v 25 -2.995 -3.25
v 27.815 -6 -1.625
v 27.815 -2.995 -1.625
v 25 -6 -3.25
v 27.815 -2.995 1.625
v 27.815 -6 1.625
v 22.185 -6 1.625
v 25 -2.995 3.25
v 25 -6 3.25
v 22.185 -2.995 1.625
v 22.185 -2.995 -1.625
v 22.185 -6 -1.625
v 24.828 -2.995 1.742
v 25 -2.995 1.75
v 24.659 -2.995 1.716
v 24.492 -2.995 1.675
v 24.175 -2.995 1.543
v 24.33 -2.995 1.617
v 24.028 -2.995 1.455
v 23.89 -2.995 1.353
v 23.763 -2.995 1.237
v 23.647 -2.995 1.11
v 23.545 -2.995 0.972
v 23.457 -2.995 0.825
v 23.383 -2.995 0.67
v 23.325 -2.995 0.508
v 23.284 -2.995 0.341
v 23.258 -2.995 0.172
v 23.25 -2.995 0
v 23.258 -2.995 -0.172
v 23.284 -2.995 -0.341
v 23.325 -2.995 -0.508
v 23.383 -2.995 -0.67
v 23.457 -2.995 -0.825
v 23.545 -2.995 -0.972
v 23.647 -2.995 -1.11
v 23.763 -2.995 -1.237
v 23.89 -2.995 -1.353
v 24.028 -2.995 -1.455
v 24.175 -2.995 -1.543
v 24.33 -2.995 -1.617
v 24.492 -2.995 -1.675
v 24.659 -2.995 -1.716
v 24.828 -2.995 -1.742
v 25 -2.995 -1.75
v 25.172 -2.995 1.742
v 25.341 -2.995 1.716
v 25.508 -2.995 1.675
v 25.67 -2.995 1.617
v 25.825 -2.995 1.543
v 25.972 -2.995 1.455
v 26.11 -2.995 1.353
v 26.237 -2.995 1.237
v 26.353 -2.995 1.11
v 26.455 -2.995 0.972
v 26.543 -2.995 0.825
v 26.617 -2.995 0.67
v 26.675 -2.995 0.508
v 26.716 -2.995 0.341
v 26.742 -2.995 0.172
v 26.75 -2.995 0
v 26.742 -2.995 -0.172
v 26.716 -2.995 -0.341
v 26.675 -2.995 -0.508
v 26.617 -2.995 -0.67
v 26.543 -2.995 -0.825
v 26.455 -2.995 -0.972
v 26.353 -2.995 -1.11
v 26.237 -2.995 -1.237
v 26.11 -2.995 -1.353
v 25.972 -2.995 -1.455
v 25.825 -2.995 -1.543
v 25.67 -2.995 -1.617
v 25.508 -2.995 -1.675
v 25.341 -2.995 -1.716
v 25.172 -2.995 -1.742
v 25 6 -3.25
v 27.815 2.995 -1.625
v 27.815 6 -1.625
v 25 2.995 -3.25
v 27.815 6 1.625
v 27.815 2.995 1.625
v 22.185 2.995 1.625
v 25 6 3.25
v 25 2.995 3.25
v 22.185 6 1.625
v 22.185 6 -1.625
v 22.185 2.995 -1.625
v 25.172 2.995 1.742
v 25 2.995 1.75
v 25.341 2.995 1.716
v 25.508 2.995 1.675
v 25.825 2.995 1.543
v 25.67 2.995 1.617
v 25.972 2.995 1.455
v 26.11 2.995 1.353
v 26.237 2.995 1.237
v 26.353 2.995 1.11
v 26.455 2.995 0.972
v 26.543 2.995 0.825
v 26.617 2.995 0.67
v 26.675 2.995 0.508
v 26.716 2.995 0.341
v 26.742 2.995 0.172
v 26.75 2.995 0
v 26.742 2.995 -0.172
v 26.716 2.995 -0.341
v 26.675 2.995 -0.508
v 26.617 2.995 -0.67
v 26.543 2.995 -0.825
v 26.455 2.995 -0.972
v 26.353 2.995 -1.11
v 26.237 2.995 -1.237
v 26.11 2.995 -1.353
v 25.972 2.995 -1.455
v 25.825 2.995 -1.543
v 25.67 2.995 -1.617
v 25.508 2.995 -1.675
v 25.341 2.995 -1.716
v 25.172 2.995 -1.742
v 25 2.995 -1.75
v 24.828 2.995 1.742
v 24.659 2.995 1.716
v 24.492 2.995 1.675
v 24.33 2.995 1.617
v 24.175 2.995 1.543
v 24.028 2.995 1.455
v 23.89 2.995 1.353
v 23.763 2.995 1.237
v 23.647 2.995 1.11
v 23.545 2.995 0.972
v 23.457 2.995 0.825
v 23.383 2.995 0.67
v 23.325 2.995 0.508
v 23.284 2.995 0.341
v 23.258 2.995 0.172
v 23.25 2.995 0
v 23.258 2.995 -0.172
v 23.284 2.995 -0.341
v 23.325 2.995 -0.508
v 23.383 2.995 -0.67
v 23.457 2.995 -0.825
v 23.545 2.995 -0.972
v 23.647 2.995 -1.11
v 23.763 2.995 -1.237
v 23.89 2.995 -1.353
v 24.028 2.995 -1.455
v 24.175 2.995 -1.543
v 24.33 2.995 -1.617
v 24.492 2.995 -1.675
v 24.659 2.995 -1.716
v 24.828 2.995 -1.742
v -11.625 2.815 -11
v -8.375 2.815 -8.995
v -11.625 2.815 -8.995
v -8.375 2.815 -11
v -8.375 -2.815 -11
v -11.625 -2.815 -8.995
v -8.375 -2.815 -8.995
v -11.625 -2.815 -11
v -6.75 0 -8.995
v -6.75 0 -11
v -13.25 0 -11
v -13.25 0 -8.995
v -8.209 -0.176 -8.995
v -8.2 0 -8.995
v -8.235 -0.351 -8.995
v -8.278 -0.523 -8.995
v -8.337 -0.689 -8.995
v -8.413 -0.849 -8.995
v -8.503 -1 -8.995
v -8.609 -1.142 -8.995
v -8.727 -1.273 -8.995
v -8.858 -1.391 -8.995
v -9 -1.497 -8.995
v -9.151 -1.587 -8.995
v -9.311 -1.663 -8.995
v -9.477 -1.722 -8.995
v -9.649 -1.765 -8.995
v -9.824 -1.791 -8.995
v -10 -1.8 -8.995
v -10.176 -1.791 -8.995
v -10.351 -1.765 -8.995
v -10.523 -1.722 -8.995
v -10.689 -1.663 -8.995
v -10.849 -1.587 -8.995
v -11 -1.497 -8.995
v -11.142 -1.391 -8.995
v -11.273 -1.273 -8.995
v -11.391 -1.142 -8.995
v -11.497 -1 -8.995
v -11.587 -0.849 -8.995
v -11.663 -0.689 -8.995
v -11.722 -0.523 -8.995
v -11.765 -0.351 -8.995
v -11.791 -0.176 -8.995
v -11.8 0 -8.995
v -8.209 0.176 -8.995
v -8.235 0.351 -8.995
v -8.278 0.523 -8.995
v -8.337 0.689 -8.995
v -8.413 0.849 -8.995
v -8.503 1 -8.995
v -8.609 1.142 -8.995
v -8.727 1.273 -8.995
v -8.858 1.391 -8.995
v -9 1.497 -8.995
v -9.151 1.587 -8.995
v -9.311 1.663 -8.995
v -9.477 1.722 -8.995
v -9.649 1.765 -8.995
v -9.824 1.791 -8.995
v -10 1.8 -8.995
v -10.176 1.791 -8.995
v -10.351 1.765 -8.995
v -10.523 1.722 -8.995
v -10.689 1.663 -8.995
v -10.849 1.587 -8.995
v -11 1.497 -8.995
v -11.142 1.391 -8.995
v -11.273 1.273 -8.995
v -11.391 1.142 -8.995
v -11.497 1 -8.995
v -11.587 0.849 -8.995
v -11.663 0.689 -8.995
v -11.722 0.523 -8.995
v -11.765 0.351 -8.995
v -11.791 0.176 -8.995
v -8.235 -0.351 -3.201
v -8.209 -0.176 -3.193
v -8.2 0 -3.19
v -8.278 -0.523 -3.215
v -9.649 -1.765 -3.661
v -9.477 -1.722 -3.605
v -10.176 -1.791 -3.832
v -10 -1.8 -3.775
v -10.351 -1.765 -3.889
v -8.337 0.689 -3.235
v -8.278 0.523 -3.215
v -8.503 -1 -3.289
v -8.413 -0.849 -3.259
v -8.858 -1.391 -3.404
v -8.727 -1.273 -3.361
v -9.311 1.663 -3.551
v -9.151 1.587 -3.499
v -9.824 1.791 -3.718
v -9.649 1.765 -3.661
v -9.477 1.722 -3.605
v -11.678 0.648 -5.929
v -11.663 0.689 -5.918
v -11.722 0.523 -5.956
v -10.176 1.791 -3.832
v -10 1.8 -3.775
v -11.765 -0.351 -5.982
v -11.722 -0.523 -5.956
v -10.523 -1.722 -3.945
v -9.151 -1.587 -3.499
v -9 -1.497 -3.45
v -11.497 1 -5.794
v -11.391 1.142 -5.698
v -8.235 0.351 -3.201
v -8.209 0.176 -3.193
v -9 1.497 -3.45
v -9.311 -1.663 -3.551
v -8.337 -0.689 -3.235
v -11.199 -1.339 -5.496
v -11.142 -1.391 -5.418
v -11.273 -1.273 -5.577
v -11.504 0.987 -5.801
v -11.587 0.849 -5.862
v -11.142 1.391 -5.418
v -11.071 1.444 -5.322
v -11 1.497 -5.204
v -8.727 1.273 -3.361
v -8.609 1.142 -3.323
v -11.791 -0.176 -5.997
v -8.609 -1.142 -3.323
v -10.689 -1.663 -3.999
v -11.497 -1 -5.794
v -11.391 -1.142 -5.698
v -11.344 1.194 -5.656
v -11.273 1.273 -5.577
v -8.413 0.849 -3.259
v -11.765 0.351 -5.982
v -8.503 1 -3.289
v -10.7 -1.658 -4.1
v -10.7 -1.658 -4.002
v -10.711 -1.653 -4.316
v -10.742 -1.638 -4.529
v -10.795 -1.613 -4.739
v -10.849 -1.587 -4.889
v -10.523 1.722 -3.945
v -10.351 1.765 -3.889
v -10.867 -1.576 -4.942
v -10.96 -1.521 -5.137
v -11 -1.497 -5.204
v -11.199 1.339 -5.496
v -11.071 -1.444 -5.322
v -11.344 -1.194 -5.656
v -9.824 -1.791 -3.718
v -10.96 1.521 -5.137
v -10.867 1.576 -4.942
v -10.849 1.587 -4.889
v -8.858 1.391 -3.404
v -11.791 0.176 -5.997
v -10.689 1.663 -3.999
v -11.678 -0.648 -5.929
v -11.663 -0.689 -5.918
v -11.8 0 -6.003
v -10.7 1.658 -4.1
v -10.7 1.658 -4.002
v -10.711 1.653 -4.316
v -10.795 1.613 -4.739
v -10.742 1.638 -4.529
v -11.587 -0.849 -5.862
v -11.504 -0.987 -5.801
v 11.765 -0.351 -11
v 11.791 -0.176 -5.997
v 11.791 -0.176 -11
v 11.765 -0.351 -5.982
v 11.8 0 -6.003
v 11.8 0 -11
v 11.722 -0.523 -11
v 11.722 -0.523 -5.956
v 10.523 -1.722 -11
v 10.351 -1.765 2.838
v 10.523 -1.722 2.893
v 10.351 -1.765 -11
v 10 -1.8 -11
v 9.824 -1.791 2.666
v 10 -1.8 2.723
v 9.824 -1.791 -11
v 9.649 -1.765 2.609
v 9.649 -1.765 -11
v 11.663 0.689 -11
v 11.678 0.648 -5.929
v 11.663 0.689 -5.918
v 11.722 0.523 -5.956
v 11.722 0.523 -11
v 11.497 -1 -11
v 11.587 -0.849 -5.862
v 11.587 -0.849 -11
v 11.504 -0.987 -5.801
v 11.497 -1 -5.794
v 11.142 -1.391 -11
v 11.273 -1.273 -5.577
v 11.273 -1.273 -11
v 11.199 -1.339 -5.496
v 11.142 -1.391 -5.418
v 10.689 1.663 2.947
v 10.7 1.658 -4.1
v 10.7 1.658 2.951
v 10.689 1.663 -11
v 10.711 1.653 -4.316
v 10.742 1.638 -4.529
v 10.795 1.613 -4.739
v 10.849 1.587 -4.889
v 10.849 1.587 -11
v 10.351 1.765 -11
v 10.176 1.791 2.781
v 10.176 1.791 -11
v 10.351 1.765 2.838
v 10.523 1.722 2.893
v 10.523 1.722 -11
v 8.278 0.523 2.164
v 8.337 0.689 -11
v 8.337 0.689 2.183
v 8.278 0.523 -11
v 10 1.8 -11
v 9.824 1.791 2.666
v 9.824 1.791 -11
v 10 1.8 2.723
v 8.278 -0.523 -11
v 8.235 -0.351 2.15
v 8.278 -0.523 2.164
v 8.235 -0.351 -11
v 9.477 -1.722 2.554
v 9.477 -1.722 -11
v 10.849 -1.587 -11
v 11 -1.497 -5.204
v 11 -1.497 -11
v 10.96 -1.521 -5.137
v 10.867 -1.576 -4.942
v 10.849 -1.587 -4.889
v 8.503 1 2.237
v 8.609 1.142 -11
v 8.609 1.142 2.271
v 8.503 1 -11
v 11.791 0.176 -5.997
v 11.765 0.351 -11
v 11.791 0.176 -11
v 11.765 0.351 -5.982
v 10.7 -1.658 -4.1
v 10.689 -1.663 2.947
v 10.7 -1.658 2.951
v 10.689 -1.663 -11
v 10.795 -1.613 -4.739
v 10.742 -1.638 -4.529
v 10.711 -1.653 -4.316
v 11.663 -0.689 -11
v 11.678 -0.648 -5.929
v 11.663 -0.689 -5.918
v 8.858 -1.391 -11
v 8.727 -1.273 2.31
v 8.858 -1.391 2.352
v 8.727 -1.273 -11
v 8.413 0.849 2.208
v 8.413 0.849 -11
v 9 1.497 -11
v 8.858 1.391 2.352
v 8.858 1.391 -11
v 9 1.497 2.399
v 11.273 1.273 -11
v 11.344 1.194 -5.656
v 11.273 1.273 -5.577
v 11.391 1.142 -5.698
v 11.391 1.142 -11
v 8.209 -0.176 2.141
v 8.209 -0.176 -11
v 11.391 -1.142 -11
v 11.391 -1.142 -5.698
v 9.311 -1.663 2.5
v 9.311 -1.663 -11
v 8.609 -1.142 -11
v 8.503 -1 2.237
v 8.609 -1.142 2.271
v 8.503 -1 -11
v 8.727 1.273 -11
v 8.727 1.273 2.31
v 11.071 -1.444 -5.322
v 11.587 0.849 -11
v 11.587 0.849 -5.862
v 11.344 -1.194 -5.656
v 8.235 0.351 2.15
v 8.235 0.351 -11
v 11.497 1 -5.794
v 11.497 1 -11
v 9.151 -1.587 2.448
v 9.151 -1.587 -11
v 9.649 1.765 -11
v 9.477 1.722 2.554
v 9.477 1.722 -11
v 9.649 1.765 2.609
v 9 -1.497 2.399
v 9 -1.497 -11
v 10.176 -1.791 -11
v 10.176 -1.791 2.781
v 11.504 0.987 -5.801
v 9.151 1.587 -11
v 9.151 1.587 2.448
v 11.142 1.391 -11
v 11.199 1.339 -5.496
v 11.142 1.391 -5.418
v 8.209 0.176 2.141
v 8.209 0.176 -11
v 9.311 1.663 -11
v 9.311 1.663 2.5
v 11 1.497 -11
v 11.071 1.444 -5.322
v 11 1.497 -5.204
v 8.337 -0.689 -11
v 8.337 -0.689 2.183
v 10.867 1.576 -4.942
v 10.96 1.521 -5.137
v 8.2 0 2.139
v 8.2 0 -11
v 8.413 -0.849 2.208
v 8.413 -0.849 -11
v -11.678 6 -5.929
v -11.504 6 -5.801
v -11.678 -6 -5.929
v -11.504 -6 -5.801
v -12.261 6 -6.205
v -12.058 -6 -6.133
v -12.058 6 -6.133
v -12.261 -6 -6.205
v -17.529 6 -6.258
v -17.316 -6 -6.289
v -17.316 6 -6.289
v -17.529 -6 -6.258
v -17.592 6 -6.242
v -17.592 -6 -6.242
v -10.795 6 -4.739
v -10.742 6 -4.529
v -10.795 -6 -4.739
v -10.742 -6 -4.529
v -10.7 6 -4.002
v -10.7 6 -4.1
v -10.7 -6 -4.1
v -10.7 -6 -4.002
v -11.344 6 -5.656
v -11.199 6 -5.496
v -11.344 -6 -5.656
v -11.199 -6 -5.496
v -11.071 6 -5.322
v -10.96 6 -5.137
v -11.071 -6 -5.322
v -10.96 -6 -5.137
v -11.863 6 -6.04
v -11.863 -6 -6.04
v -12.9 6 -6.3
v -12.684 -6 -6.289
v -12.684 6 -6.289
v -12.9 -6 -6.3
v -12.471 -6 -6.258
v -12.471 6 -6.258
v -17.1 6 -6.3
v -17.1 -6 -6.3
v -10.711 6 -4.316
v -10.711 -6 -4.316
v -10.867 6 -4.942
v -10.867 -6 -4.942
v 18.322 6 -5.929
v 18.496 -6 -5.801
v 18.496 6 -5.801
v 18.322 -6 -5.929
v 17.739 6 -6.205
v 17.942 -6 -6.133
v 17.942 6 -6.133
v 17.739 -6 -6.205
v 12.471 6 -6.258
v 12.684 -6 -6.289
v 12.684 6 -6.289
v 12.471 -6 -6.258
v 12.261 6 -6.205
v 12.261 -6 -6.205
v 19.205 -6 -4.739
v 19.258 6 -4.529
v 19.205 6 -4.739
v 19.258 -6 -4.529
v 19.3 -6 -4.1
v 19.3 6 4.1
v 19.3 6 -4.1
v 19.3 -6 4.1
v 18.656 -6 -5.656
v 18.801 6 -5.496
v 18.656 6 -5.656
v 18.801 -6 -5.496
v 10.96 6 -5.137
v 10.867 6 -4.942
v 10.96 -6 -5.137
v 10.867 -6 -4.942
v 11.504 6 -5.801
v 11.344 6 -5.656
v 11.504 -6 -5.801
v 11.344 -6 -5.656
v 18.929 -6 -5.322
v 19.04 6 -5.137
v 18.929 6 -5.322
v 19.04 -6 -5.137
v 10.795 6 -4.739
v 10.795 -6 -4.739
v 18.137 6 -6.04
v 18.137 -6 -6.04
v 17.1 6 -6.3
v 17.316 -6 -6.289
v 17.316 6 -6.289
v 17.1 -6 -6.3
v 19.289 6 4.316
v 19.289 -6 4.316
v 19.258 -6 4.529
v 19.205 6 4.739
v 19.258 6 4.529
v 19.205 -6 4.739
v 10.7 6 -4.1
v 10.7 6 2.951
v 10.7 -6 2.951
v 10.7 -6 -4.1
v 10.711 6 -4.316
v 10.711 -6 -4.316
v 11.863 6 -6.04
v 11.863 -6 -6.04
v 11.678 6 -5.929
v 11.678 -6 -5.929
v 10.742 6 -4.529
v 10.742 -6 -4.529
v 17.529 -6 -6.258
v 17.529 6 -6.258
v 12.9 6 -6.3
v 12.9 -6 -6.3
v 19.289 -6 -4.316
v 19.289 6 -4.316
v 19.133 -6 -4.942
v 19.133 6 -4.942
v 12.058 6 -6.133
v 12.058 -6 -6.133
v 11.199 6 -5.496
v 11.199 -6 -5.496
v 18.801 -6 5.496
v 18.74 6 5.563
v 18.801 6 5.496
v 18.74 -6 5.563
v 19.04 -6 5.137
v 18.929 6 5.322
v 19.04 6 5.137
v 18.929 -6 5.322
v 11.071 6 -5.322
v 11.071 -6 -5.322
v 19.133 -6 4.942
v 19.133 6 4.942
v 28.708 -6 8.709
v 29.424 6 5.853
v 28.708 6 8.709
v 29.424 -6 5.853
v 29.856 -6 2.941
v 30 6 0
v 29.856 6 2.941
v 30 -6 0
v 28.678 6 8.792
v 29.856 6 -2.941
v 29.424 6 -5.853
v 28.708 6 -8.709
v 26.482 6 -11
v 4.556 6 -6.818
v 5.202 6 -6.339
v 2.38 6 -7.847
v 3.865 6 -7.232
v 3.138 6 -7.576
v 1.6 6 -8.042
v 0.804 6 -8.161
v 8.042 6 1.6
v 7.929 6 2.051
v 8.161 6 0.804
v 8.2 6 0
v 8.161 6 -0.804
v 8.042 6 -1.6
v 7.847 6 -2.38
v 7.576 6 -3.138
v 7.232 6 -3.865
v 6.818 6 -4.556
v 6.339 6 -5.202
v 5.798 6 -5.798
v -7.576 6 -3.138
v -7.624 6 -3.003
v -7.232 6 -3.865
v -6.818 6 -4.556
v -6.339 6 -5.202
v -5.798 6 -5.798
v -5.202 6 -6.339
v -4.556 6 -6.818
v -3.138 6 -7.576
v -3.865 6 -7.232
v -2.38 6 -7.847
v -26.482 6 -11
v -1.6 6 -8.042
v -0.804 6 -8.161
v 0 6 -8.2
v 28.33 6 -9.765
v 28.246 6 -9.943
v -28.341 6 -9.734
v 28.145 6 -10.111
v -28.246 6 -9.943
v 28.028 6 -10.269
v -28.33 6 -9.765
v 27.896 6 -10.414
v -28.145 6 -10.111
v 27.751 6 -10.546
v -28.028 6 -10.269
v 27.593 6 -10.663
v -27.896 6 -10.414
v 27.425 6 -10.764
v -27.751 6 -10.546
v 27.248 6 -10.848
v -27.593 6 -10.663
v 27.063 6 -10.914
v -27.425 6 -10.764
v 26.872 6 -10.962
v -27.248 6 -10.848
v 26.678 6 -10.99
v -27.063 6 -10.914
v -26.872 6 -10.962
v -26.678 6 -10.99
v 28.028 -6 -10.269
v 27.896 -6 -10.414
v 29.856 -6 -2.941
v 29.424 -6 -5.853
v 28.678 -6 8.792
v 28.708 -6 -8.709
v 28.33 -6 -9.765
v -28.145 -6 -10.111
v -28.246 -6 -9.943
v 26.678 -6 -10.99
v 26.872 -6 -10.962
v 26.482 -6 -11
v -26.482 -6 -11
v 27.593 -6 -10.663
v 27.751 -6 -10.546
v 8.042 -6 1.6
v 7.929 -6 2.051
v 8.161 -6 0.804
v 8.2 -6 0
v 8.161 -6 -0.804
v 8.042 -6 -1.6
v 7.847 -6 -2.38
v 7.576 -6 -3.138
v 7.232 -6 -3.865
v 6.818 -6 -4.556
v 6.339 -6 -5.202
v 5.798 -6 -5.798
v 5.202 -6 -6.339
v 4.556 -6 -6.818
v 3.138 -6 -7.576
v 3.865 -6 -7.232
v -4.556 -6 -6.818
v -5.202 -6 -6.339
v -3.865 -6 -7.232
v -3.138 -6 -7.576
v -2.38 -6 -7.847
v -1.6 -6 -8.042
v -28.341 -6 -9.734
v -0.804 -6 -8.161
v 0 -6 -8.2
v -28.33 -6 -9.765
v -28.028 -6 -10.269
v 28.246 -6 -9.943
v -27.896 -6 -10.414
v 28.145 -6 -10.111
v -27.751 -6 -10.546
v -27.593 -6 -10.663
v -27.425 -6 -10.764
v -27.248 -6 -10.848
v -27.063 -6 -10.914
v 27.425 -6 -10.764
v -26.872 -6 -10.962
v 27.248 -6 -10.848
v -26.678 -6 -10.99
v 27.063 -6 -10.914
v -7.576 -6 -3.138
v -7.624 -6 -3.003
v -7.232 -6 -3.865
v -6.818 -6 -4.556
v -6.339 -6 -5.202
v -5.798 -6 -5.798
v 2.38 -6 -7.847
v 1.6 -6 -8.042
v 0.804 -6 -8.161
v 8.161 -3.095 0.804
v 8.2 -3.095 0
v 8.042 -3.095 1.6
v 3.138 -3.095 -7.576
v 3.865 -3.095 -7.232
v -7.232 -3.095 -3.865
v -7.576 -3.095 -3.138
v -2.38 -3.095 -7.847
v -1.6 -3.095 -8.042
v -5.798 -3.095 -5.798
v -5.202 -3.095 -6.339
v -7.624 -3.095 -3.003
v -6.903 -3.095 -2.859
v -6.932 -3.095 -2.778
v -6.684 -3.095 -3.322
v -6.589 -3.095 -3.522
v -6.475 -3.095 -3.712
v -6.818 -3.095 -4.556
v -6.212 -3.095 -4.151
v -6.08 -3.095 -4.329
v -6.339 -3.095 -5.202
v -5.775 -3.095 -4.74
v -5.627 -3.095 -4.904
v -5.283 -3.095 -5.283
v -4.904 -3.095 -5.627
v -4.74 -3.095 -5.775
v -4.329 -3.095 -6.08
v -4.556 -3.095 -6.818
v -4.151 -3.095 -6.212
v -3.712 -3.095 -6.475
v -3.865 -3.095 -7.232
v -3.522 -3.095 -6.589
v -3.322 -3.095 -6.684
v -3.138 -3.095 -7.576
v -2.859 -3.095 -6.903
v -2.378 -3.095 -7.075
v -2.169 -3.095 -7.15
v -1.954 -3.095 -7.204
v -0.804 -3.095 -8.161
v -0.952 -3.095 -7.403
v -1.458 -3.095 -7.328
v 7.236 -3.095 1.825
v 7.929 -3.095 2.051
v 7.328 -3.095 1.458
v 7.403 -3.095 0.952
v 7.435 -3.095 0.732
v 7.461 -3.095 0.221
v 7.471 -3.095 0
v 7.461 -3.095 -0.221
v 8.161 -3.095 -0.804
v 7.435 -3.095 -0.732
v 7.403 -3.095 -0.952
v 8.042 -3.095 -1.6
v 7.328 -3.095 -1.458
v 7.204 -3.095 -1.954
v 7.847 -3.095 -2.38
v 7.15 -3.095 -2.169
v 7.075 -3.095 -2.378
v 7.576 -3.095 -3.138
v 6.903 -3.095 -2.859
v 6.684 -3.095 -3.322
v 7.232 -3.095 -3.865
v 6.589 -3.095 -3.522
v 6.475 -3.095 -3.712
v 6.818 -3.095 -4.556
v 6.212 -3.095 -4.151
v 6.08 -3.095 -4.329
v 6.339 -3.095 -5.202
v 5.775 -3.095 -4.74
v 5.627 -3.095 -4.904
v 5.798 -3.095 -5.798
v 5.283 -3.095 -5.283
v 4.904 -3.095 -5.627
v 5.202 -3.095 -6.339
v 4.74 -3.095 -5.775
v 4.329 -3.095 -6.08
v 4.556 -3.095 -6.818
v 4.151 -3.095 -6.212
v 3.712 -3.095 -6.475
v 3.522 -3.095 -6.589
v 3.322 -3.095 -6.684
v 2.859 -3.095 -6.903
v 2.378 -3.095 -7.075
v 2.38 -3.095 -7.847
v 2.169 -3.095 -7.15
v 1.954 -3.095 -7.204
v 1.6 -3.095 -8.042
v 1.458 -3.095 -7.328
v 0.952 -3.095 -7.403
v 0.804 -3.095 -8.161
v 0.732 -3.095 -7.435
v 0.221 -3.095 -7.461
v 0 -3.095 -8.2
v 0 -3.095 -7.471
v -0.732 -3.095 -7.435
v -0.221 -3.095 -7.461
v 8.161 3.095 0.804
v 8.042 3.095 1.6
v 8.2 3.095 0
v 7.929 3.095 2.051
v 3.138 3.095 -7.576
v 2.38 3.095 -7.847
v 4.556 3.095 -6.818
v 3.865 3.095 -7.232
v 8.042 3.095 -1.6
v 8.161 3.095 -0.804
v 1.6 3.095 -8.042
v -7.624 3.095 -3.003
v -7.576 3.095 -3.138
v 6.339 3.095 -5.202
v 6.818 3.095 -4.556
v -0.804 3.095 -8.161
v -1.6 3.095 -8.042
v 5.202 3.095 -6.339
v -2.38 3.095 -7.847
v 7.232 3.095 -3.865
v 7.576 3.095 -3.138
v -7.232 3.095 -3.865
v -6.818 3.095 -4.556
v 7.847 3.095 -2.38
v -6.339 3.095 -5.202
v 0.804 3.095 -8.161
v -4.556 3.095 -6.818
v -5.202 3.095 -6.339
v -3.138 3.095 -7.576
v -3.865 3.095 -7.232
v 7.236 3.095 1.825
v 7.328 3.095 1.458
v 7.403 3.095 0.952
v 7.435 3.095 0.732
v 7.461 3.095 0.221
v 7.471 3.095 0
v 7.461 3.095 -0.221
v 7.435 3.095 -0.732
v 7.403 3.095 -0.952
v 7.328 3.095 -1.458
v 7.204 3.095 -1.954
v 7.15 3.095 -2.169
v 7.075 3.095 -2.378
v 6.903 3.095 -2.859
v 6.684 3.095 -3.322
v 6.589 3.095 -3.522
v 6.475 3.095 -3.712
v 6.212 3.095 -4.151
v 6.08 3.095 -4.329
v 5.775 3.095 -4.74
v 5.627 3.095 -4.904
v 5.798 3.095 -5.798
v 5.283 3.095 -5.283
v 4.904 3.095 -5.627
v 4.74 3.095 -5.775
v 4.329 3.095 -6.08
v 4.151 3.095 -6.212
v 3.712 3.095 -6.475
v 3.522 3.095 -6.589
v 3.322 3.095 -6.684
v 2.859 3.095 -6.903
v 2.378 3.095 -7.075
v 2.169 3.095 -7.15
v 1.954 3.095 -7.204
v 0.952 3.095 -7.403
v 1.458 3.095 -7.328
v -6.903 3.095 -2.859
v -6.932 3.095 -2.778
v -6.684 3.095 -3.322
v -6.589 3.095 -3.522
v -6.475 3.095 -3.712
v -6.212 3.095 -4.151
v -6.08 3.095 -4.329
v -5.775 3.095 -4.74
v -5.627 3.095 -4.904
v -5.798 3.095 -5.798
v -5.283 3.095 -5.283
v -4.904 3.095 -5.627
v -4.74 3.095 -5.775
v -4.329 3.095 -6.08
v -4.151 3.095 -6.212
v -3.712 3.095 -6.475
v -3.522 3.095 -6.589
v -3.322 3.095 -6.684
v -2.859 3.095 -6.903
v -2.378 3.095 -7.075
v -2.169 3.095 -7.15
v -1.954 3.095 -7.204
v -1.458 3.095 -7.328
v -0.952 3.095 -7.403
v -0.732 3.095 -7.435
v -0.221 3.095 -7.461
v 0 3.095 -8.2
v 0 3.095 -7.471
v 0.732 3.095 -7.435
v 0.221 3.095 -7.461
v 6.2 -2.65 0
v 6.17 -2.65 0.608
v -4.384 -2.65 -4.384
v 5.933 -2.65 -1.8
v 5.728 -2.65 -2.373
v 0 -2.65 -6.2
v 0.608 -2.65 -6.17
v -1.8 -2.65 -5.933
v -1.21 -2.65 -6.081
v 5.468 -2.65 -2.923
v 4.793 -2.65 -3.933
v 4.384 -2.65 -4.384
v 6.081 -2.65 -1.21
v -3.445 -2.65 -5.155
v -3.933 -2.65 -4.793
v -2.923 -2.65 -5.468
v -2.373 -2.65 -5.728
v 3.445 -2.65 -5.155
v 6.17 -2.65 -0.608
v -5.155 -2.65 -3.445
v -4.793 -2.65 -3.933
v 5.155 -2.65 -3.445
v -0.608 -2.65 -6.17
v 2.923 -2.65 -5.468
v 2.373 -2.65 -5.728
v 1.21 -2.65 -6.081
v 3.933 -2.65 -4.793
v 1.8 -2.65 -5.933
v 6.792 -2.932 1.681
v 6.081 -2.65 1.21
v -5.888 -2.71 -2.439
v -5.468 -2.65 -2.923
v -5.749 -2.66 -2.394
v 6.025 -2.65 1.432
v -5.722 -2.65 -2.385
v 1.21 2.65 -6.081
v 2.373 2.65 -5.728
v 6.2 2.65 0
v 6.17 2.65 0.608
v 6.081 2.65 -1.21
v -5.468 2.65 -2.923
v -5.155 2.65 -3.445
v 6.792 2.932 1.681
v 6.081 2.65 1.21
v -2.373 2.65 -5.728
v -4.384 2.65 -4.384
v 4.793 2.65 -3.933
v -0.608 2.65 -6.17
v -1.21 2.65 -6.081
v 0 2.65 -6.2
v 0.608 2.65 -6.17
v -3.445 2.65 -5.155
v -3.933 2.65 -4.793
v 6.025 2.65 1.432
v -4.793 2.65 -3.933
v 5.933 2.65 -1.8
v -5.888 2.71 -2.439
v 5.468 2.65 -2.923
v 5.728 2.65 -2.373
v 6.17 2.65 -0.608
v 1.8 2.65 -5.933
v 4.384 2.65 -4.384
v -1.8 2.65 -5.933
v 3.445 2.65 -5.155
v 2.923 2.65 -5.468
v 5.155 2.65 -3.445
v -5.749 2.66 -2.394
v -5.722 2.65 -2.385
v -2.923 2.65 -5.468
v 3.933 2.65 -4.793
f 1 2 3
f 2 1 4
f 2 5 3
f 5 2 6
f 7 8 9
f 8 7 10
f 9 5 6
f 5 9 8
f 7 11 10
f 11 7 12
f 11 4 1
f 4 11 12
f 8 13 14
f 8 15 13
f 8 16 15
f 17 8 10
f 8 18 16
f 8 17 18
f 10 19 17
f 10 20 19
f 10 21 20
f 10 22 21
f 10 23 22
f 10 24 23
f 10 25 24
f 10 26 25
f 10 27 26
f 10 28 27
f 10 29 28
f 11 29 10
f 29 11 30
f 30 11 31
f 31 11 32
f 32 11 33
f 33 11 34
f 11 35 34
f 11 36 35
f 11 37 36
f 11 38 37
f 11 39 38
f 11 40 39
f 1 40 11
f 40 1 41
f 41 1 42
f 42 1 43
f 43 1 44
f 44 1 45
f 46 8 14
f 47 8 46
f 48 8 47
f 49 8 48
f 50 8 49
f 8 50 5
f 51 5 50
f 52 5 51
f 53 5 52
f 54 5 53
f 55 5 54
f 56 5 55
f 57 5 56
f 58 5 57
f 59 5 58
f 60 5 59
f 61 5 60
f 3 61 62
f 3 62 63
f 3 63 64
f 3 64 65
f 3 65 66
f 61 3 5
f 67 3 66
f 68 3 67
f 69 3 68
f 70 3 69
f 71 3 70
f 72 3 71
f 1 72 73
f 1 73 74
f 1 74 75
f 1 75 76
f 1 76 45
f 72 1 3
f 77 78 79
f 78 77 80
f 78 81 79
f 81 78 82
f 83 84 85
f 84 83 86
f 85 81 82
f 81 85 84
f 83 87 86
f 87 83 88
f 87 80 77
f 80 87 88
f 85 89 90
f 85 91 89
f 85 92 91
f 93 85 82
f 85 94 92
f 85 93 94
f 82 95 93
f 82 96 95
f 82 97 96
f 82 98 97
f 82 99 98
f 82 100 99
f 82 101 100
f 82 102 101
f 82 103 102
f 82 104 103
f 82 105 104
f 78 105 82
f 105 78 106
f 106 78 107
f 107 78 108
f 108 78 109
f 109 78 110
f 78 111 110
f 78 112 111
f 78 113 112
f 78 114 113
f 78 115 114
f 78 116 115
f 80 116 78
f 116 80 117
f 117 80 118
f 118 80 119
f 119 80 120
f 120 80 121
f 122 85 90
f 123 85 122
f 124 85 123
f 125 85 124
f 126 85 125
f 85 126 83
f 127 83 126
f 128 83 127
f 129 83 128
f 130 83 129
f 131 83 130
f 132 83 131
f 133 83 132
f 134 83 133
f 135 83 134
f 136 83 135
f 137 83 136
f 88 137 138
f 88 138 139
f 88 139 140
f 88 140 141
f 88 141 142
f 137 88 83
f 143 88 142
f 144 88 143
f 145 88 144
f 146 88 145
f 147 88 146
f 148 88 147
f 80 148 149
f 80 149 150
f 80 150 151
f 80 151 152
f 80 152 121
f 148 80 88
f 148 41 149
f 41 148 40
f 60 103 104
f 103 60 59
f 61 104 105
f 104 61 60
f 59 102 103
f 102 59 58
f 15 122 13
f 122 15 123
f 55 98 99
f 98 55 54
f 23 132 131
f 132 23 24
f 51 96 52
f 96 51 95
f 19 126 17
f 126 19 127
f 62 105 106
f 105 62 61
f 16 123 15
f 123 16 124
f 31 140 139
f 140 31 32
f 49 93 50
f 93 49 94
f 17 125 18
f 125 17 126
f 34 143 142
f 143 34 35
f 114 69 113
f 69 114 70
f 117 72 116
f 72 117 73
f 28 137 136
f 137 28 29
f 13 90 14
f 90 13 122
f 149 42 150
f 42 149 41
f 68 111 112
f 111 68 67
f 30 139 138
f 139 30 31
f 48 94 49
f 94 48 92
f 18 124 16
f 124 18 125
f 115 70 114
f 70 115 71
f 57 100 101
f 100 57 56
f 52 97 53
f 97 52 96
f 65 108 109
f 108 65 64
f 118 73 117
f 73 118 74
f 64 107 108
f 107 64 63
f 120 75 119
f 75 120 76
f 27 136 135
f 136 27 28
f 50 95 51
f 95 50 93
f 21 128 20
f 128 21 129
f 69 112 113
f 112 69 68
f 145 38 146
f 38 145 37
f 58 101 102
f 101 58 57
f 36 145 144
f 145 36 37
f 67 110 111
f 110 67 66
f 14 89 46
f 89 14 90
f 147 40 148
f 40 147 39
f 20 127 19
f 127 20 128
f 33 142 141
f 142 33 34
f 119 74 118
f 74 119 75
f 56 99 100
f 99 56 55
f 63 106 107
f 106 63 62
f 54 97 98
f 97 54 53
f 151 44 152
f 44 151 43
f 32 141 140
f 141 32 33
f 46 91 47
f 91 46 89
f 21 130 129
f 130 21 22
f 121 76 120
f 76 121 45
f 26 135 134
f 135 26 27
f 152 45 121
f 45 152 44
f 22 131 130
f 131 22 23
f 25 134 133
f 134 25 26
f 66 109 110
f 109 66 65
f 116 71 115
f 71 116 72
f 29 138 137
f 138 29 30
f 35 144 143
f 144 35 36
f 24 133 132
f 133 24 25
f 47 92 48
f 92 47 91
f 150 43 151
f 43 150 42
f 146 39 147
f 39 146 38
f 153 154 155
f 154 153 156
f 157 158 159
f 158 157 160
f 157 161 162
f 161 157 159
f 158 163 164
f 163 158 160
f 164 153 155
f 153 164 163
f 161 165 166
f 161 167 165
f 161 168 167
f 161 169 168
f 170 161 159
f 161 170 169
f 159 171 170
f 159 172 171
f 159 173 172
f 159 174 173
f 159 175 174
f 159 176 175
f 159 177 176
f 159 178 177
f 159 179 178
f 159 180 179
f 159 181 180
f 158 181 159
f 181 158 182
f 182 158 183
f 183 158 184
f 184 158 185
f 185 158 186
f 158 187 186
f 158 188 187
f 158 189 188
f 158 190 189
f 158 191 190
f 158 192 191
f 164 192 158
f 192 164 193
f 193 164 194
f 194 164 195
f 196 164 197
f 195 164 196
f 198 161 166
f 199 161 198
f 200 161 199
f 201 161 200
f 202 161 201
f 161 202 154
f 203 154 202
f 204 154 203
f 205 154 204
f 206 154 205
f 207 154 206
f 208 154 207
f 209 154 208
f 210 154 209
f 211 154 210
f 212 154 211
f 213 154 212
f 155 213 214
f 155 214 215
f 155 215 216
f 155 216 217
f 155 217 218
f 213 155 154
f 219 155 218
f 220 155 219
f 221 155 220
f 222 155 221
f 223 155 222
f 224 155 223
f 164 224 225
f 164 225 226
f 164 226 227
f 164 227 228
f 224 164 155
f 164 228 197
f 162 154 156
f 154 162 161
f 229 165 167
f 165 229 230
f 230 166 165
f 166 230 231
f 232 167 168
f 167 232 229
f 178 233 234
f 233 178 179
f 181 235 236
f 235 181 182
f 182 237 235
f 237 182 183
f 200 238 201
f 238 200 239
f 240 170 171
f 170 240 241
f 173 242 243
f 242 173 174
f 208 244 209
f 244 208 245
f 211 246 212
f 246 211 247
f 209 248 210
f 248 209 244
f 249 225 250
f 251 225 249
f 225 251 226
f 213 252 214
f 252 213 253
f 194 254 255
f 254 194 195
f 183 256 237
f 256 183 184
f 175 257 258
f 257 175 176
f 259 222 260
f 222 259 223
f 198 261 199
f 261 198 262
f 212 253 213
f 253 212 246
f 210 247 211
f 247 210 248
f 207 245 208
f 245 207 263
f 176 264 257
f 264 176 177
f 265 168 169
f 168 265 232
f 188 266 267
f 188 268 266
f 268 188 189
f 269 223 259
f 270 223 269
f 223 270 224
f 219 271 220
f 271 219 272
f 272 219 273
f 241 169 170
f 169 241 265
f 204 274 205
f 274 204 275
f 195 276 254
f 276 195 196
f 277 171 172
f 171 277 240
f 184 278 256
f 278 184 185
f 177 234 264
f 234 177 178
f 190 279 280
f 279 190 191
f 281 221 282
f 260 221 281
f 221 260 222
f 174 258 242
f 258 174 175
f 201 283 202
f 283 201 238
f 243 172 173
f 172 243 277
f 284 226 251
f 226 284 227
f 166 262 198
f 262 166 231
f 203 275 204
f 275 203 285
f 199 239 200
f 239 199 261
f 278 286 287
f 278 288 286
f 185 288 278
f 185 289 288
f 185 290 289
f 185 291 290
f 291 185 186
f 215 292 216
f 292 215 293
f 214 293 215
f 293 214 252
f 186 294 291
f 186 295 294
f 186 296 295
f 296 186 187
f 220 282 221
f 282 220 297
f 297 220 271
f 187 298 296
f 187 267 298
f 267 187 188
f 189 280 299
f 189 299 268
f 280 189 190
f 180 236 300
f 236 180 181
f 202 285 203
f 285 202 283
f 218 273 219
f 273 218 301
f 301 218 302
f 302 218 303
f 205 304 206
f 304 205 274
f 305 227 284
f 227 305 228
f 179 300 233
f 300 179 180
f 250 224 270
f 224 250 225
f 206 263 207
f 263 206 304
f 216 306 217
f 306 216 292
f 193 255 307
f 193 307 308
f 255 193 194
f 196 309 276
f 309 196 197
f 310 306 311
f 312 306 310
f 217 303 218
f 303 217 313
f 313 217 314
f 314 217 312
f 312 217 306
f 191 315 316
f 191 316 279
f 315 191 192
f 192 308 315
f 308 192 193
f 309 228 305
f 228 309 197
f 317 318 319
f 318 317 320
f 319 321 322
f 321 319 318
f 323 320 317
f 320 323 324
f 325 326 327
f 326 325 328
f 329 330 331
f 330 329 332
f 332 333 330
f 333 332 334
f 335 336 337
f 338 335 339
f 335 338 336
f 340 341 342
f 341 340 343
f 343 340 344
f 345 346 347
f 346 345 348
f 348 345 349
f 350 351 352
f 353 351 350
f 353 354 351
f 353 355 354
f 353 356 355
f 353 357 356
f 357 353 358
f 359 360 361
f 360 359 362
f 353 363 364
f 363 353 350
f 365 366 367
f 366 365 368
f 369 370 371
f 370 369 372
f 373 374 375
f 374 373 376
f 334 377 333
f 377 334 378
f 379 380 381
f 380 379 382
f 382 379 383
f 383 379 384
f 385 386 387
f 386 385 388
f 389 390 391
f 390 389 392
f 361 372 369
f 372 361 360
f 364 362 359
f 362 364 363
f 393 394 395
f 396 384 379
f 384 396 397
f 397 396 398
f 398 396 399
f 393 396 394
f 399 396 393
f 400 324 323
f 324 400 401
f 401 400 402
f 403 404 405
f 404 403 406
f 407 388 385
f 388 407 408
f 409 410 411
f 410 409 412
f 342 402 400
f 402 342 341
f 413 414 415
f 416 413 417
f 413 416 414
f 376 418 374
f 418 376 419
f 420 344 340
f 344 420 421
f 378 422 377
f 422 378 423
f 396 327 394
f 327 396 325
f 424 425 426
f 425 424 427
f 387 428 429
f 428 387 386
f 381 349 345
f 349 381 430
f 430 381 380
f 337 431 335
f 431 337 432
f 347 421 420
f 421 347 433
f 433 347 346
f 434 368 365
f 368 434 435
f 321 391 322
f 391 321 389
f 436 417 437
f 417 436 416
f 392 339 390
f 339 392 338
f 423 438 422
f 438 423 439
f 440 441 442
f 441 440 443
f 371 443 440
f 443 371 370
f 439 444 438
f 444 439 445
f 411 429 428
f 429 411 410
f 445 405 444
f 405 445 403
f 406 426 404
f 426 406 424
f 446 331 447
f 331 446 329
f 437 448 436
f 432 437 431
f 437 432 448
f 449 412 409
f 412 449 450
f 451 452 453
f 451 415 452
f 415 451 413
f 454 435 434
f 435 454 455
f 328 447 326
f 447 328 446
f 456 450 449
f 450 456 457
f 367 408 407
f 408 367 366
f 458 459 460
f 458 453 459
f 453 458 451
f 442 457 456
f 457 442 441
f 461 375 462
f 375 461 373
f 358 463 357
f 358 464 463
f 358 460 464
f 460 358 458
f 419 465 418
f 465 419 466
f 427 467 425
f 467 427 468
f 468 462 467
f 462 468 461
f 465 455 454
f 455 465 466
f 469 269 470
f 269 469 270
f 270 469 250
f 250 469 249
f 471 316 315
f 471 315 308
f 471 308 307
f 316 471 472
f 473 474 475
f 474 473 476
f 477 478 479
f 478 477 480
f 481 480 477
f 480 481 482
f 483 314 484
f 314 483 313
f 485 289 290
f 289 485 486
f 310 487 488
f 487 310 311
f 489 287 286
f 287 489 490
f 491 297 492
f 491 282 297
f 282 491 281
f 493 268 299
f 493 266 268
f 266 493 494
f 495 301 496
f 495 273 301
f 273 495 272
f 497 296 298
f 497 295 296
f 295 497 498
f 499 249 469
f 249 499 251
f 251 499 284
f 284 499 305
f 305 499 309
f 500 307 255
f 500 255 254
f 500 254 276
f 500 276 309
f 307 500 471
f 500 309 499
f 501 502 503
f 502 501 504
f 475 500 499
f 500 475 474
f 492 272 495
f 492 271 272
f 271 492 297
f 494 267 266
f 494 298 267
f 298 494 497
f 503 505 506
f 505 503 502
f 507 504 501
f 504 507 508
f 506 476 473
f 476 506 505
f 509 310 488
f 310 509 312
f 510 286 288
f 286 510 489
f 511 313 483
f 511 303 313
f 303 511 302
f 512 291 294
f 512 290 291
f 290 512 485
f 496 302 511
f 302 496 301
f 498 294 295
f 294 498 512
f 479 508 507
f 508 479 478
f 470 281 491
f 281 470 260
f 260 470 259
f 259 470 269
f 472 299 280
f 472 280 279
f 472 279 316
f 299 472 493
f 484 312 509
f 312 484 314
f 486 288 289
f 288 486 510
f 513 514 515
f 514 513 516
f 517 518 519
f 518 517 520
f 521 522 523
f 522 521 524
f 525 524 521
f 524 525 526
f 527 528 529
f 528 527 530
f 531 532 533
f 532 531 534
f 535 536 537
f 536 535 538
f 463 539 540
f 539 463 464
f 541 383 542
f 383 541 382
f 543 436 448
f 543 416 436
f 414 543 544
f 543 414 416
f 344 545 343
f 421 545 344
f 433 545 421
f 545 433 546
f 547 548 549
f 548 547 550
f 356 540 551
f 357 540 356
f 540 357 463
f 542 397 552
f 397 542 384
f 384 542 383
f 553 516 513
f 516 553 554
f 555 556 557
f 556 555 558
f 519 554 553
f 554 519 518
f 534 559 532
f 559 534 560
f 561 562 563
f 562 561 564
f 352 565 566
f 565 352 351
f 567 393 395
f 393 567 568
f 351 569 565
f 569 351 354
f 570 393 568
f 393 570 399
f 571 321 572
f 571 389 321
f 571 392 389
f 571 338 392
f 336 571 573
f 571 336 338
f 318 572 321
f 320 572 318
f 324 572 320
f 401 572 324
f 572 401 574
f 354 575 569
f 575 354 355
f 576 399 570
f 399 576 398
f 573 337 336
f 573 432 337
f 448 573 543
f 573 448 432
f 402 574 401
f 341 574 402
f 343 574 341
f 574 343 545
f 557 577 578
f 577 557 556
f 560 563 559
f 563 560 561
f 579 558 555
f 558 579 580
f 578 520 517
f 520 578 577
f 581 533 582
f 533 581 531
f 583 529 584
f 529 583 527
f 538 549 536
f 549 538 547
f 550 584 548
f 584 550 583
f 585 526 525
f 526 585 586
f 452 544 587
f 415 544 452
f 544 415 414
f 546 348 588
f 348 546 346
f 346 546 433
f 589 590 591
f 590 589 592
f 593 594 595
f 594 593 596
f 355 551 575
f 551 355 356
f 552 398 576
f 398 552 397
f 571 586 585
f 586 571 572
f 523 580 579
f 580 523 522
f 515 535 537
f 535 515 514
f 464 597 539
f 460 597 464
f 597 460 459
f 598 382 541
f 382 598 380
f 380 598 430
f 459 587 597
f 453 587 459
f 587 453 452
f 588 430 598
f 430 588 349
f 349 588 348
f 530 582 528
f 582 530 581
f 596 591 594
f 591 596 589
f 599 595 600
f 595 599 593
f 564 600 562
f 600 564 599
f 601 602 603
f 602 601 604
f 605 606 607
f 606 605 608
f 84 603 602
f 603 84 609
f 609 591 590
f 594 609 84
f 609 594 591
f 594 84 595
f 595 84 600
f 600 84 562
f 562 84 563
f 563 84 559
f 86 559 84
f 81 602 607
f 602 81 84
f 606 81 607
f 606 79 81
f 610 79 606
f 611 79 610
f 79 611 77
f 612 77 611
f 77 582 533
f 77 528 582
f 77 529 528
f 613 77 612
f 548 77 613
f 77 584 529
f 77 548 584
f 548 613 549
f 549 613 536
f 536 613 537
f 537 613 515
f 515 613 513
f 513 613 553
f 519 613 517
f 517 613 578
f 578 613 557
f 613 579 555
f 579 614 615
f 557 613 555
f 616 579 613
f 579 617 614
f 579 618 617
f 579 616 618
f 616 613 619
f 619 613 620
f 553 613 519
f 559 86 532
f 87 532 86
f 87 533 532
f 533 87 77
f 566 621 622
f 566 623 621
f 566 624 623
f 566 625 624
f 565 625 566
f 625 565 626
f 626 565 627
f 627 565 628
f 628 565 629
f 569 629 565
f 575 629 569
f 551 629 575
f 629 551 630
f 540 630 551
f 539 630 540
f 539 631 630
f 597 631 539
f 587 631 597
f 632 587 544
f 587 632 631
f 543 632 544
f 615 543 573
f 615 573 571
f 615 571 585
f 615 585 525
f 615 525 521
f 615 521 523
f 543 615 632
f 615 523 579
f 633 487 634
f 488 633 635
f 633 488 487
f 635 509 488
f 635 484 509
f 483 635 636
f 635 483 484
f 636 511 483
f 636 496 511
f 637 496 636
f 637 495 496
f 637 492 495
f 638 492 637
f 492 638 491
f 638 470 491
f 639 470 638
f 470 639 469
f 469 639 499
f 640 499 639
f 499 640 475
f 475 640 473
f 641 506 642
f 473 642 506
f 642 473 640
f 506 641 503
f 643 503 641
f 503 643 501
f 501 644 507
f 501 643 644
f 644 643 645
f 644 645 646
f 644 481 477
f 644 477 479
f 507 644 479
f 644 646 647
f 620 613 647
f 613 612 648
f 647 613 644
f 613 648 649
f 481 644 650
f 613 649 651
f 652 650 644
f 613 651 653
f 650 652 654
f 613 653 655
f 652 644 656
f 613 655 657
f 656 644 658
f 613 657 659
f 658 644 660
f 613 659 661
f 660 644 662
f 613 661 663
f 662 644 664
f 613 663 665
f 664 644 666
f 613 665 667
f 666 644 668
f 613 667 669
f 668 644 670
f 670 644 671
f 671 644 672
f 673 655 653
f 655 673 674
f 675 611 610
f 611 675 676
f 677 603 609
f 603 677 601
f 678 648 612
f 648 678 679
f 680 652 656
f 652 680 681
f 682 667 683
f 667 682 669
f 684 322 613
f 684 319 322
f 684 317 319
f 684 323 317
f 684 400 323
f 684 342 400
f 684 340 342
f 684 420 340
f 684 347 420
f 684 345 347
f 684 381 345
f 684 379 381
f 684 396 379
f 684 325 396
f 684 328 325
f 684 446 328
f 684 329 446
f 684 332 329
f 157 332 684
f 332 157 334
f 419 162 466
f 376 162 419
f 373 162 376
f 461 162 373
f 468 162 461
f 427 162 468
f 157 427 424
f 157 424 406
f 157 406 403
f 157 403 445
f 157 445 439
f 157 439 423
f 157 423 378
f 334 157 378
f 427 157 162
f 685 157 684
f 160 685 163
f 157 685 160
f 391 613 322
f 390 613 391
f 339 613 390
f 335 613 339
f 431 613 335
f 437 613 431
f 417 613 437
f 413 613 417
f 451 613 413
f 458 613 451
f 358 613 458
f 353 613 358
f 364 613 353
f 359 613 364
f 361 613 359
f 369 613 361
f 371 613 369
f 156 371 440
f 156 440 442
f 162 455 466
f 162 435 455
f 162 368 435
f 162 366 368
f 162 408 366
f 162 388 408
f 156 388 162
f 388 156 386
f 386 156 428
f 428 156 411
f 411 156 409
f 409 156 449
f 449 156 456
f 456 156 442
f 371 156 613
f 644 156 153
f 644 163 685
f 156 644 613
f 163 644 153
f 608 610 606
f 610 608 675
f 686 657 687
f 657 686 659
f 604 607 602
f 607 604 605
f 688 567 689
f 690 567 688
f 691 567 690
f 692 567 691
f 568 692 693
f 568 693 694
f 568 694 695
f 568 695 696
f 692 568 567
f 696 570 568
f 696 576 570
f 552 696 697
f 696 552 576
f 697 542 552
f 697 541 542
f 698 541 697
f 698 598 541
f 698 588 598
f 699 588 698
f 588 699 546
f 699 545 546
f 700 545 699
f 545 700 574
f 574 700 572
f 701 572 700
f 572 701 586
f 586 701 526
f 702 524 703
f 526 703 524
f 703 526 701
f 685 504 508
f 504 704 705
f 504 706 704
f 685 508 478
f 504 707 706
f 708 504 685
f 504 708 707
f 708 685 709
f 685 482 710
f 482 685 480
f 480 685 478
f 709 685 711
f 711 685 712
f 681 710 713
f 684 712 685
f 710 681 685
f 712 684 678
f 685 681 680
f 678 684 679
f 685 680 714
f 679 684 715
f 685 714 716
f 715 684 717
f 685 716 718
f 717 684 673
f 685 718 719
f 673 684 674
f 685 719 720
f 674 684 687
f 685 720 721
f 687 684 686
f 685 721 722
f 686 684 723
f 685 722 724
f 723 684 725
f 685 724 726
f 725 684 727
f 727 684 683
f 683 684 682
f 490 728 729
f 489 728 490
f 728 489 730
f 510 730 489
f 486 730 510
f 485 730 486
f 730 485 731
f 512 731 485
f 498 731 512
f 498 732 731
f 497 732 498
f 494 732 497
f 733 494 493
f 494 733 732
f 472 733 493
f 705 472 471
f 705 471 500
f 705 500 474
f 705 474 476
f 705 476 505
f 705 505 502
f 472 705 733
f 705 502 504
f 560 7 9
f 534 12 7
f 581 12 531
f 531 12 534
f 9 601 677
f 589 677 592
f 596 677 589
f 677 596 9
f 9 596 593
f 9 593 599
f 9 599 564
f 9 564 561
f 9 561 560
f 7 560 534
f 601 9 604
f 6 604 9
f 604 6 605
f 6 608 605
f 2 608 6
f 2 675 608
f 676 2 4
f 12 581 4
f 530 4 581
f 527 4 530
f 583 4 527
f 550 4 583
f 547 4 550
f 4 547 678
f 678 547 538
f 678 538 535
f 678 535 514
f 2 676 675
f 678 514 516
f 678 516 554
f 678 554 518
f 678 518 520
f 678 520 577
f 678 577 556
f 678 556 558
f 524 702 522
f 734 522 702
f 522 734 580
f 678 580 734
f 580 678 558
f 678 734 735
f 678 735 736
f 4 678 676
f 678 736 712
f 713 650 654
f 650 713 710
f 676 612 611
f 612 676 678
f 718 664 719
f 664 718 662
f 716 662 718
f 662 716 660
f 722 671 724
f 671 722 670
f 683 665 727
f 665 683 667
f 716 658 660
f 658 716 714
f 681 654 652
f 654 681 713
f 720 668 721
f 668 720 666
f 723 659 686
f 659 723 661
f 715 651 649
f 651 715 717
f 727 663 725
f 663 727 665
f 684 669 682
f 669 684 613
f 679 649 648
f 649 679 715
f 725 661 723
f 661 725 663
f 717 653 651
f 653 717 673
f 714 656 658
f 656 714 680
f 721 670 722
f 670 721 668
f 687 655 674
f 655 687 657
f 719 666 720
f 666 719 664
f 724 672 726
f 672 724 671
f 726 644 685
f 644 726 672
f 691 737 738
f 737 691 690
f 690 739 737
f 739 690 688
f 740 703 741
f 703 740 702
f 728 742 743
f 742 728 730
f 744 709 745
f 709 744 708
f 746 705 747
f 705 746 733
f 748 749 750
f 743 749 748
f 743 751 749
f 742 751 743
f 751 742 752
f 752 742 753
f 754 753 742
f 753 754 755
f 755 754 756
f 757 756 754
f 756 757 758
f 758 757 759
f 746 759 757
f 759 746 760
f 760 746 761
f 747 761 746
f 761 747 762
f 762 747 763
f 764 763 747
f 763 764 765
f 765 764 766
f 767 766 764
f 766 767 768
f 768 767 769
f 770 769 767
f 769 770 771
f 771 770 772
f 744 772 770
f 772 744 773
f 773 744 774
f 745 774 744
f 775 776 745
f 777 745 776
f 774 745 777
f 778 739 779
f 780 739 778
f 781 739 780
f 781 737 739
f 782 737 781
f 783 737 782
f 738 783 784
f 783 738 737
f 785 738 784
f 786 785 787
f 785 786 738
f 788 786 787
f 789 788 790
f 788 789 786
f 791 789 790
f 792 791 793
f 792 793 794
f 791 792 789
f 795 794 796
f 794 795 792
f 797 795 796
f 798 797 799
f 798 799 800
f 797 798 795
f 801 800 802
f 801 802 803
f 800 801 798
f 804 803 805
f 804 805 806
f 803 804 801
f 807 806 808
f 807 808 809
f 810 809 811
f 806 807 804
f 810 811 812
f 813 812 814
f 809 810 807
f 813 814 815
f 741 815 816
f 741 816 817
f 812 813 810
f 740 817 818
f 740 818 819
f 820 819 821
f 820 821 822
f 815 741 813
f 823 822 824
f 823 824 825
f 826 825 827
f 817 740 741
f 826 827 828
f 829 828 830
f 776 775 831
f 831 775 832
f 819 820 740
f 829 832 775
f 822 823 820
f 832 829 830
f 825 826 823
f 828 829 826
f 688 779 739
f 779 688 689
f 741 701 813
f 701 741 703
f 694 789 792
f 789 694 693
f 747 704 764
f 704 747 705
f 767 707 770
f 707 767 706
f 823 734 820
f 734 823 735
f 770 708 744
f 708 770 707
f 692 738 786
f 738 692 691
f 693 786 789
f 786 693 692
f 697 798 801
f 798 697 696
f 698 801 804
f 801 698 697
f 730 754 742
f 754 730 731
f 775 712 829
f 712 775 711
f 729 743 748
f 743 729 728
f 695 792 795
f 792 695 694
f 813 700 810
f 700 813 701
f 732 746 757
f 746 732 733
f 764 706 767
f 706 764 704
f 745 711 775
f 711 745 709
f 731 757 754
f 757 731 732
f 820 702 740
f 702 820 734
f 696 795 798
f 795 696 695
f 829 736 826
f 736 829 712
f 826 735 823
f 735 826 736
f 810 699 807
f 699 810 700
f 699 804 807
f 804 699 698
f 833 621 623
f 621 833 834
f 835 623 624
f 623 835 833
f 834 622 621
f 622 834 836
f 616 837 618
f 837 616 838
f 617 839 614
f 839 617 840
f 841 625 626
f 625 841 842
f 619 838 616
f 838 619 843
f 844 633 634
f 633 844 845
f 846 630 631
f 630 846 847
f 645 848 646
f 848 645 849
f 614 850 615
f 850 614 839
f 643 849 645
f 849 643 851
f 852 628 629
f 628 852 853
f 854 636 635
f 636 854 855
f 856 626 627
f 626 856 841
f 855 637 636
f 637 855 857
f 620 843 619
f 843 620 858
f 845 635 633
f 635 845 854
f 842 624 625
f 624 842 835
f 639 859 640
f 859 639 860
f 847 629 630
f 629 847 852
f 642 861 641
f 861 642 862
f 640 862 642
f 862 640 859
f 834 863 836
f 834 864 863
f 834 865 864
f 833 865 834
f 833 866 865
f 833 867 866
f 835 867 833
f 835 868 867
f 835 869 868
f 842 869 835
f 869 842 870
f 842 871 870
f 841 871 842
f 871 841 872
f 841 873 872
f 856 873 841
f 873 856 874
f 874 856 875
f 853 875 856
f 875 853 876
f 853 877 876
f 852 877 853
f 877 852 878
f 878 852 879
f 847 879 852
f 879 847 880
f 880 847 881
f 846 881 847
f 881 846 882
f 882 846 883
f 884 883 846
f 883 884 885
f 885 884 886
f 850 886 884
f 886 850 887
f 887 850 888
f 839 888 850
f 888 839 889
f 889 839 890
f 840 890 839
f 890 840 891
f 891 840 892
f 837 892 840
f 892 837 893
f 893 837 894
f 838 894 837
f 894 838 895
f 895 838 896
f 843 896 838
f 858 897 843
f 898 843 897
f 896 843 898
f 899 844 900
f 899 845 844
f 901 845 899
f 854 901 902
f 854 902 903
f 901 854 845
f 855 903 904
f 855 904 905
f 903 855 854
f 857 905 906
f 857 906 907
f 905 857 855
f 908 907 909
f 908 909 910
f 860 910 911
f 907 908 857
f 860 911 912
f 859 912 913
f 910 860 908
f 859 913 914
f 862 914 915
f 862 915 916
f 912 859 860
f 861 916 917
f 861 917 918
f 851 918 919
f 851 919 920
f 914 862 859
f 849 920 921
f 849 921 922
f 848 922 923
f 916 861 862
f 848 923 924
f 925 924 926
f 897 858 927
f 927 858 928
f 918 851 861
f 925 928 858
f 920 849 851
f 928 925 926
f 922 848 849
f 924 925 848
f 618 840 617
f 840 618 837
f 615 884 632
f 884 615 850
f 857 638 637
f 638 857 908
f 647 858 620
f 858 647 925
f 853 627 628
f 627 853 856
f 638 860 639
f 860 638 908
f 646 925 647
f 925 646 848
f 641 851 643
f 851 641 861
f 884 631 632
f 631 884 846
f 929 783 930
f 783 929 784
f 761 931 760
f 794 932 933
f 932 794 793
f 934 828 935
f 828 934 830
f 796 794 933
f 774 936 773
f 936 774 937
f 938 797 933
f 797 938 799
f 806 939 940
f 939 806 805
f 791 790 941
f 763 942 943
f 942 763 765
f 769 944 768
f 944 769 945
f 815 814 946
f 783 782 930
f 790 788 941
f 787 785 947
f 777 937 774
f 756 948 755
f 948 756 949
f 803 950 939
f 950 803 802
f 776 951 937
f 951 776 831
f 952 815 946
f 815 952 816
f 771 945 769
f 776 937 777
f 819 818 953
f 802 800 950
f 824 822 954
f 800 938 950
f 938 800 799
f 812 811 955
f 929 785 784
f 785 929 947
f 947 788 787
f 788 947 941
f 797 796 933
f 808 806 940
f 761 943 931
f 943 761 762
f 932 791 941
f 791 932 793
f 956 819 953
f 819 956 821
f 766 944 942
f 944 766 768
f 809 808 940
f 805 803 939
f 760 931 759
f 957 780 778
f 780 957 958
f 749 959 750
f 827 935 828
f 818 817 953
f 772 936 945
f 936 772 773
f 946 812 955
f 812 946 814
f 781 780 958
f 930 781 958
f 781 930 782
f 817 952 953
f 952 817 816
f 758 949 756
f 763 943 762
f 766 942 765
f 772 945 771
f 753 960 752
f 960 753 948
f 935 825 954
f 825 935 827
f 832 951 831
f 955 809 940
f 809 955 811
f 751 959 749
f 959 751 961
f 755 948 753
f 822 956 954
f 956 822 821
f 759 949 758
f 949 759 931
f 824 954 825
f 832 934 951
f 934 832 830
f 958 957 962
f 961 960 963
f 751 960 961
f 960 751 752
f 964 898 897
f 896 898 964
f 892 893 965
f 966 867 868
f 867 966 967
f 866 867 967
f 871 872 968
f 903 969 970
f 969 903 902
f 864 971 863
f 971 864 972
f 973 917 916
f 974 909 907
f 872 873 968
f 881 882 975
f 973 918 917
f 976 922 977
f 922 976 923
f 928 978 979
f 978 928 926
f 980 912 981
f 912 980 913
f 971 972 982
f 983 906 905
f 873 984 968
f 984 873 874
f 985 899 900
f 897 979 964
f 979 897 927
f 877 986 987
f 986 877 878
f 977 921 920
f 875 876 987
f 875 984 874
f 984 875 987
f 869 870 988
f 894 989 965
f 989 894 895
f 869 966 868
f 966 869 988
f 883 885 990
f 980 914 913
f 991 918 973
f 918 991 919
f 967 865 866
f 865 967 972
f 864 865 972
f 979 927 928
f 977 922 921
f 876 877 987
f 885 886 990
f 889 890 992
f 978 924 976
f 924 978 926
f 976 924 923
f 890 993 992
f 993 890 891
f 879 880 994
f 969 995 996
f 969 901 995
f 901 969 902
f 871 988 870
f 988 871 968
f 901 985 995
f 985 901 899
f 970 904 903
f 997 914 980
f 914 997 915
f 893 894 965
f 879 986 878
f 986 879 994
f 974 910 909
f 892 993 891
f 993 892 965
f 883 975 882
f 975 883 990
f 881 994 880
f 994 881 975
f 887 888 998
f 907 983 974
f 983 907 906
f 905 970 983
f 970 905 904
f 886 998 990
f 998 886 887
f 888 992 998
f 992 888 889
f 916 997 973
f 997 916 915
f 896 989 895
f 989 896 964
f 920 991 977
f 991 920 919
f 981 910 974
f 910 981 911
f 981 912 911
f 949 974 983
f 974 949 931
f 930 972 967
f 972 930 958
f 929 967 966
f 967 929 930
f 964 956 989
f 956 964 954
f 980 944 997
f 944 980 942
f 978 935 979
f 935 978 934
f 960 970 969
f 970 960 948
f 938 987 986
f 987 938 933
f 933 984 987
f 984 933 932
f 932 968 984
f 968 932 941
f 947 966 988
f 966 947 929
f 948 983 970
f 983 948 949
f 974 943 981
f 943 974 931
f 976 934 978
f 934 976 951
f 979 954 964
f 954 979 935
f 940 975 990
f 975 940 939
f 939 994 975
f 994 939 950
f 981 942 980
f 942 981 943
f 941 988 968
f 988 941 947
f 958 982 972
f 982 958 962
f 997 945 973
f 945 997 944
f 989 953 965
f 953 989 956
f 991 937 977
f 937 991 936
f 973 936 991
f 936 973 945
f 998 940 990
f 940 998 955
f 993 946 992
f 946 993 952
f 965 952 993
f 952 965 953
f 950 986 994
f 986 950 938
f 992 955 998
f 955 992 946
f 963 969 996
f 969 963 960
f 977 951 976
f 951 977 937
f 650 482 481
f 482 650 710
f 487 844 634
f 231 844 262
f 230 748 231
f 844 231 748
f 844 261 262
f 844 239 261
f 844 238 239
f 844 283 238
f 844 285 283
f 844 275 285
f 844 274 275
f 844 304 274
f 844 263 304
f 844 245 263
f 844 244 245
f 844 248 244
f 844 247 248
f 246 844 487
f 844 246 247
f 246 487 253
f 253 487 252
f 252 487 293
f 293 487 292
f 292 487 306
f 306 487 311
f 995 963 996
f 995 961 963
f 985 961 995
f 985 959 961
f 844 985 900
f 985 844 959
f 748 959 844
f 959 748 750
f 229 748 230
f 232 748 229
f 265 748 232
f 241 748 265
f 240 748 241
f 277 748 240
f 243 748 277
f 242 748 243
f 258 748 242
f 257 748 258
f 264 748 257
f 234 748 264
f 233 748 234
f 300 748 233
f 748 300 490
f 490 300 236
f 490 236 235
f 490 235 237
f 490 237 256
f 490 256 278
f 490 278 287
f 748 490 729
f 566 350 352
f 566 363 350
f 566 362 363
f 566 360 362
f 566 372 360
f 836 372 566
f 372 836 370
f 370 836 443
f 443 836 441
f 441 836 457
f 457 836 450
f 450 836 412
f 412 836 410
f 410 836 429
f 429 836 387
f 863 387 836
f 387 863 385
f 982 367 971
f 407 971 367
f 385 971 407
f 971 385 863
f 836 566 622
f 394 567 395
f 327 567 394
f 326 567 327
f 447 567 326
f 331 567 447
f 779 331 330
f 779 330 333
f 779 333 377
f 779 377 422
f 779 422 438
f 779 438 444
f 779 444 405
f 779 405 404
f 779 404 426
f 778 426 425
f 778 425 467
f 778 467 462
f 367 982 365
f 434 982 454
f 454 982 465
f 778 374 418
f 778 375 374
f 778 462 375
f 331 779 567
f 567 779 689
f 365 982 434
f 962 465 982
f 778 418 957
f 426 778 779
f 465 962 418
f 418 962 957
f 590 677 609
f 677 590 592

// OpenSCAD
/*
Info:
You need two of these, 180° rotated (see last line) to mount your hotend. It is suitable for (and tested with) E3D-Hotends.

Improvement:
- much more sturdy than old design
- you can put your heater/fan/tempsensor-cable through the cutout

TODO: 
- 

*/

$fn=64;

function signum(x) = (x < 0)?-1:(x > 0)?1:0; 

module bowden_clamp() 
{ 
    difference() 
    {
        translate([0,0,-0]) linear_extrude(height=12,convexity=30,center=true) difference() 
        {
            // basic shape
            minkowski() 
            {
                intersection() 
                {
                    square([60-2,22-4],center=true);
                    circle(r=30-2);
                }
                circle(r=2); // rounded corners
            }
        }
	
        for(x=[-25,25]) 
        {
            // M4 socket heads and mounting holes
            translate([x,0,+4.5]) rotate([0,0,30]) cylinder(d=6.5,h=3.01,center=true, $fn=6);
            translate([x,0,-4.5]) rotate([0,0,30]) cylinder(d=6.5,h=3.01,center=true, $fn=6);
            translate([x,0,0]) cylinder(d=3.5,h=15,center=true);
        }

        for (x=[-10,+10]) 
        {
            translate([x,signum(x)*10.5,0]) rotate([90,0,0]) cylinder(d=6.5,h=3.01,center=true, $fn=6);
            translate([x,0,0]) rotate([90,0,0]) cylinder(d=3.6,h=25,center=true); 
        }

        // groove mount for E3D 
        oW = 16.4; // E3D outer width
        iW = 12.4; // E3D inner width
        translate([0,0,+4.6]) cylinder(d=oW,h=3.01,center=true);
        translate([0,0,-4.6]) cylinder(d=oW,h=3.01,center=true);
        translate([0,0,+3.0]) cylinder(d1=iW,d2=oW,h=0.7,center=true);
        translate([0,0,-3.0]) cylinder(d1=oW,d2=iW,h=0.7,center=true);
        translate([0,0,+0.0]) cylinder(d=iW,h=15,center=true);
    
        // unnecessary vents
        for(x=[-15,15]) translate([x,0,-1]) minkowski() 
        {
            cube([4.2,8.2,13],center=true);
            cylinder(r=2.2,h=13);
        }
        // cut part in half
        rotate([0,0,18]) translate([-50,-0.5,-20]) cube([100,50,55]);
    }
}

// Test-Preview
//rotate([ 0, 0,  0]) bowden_clamp();
//rotate([ 0, 0,180]) bowden_clamp();

// Printable:
rotate([90,0,0]) bowden_clamp();
